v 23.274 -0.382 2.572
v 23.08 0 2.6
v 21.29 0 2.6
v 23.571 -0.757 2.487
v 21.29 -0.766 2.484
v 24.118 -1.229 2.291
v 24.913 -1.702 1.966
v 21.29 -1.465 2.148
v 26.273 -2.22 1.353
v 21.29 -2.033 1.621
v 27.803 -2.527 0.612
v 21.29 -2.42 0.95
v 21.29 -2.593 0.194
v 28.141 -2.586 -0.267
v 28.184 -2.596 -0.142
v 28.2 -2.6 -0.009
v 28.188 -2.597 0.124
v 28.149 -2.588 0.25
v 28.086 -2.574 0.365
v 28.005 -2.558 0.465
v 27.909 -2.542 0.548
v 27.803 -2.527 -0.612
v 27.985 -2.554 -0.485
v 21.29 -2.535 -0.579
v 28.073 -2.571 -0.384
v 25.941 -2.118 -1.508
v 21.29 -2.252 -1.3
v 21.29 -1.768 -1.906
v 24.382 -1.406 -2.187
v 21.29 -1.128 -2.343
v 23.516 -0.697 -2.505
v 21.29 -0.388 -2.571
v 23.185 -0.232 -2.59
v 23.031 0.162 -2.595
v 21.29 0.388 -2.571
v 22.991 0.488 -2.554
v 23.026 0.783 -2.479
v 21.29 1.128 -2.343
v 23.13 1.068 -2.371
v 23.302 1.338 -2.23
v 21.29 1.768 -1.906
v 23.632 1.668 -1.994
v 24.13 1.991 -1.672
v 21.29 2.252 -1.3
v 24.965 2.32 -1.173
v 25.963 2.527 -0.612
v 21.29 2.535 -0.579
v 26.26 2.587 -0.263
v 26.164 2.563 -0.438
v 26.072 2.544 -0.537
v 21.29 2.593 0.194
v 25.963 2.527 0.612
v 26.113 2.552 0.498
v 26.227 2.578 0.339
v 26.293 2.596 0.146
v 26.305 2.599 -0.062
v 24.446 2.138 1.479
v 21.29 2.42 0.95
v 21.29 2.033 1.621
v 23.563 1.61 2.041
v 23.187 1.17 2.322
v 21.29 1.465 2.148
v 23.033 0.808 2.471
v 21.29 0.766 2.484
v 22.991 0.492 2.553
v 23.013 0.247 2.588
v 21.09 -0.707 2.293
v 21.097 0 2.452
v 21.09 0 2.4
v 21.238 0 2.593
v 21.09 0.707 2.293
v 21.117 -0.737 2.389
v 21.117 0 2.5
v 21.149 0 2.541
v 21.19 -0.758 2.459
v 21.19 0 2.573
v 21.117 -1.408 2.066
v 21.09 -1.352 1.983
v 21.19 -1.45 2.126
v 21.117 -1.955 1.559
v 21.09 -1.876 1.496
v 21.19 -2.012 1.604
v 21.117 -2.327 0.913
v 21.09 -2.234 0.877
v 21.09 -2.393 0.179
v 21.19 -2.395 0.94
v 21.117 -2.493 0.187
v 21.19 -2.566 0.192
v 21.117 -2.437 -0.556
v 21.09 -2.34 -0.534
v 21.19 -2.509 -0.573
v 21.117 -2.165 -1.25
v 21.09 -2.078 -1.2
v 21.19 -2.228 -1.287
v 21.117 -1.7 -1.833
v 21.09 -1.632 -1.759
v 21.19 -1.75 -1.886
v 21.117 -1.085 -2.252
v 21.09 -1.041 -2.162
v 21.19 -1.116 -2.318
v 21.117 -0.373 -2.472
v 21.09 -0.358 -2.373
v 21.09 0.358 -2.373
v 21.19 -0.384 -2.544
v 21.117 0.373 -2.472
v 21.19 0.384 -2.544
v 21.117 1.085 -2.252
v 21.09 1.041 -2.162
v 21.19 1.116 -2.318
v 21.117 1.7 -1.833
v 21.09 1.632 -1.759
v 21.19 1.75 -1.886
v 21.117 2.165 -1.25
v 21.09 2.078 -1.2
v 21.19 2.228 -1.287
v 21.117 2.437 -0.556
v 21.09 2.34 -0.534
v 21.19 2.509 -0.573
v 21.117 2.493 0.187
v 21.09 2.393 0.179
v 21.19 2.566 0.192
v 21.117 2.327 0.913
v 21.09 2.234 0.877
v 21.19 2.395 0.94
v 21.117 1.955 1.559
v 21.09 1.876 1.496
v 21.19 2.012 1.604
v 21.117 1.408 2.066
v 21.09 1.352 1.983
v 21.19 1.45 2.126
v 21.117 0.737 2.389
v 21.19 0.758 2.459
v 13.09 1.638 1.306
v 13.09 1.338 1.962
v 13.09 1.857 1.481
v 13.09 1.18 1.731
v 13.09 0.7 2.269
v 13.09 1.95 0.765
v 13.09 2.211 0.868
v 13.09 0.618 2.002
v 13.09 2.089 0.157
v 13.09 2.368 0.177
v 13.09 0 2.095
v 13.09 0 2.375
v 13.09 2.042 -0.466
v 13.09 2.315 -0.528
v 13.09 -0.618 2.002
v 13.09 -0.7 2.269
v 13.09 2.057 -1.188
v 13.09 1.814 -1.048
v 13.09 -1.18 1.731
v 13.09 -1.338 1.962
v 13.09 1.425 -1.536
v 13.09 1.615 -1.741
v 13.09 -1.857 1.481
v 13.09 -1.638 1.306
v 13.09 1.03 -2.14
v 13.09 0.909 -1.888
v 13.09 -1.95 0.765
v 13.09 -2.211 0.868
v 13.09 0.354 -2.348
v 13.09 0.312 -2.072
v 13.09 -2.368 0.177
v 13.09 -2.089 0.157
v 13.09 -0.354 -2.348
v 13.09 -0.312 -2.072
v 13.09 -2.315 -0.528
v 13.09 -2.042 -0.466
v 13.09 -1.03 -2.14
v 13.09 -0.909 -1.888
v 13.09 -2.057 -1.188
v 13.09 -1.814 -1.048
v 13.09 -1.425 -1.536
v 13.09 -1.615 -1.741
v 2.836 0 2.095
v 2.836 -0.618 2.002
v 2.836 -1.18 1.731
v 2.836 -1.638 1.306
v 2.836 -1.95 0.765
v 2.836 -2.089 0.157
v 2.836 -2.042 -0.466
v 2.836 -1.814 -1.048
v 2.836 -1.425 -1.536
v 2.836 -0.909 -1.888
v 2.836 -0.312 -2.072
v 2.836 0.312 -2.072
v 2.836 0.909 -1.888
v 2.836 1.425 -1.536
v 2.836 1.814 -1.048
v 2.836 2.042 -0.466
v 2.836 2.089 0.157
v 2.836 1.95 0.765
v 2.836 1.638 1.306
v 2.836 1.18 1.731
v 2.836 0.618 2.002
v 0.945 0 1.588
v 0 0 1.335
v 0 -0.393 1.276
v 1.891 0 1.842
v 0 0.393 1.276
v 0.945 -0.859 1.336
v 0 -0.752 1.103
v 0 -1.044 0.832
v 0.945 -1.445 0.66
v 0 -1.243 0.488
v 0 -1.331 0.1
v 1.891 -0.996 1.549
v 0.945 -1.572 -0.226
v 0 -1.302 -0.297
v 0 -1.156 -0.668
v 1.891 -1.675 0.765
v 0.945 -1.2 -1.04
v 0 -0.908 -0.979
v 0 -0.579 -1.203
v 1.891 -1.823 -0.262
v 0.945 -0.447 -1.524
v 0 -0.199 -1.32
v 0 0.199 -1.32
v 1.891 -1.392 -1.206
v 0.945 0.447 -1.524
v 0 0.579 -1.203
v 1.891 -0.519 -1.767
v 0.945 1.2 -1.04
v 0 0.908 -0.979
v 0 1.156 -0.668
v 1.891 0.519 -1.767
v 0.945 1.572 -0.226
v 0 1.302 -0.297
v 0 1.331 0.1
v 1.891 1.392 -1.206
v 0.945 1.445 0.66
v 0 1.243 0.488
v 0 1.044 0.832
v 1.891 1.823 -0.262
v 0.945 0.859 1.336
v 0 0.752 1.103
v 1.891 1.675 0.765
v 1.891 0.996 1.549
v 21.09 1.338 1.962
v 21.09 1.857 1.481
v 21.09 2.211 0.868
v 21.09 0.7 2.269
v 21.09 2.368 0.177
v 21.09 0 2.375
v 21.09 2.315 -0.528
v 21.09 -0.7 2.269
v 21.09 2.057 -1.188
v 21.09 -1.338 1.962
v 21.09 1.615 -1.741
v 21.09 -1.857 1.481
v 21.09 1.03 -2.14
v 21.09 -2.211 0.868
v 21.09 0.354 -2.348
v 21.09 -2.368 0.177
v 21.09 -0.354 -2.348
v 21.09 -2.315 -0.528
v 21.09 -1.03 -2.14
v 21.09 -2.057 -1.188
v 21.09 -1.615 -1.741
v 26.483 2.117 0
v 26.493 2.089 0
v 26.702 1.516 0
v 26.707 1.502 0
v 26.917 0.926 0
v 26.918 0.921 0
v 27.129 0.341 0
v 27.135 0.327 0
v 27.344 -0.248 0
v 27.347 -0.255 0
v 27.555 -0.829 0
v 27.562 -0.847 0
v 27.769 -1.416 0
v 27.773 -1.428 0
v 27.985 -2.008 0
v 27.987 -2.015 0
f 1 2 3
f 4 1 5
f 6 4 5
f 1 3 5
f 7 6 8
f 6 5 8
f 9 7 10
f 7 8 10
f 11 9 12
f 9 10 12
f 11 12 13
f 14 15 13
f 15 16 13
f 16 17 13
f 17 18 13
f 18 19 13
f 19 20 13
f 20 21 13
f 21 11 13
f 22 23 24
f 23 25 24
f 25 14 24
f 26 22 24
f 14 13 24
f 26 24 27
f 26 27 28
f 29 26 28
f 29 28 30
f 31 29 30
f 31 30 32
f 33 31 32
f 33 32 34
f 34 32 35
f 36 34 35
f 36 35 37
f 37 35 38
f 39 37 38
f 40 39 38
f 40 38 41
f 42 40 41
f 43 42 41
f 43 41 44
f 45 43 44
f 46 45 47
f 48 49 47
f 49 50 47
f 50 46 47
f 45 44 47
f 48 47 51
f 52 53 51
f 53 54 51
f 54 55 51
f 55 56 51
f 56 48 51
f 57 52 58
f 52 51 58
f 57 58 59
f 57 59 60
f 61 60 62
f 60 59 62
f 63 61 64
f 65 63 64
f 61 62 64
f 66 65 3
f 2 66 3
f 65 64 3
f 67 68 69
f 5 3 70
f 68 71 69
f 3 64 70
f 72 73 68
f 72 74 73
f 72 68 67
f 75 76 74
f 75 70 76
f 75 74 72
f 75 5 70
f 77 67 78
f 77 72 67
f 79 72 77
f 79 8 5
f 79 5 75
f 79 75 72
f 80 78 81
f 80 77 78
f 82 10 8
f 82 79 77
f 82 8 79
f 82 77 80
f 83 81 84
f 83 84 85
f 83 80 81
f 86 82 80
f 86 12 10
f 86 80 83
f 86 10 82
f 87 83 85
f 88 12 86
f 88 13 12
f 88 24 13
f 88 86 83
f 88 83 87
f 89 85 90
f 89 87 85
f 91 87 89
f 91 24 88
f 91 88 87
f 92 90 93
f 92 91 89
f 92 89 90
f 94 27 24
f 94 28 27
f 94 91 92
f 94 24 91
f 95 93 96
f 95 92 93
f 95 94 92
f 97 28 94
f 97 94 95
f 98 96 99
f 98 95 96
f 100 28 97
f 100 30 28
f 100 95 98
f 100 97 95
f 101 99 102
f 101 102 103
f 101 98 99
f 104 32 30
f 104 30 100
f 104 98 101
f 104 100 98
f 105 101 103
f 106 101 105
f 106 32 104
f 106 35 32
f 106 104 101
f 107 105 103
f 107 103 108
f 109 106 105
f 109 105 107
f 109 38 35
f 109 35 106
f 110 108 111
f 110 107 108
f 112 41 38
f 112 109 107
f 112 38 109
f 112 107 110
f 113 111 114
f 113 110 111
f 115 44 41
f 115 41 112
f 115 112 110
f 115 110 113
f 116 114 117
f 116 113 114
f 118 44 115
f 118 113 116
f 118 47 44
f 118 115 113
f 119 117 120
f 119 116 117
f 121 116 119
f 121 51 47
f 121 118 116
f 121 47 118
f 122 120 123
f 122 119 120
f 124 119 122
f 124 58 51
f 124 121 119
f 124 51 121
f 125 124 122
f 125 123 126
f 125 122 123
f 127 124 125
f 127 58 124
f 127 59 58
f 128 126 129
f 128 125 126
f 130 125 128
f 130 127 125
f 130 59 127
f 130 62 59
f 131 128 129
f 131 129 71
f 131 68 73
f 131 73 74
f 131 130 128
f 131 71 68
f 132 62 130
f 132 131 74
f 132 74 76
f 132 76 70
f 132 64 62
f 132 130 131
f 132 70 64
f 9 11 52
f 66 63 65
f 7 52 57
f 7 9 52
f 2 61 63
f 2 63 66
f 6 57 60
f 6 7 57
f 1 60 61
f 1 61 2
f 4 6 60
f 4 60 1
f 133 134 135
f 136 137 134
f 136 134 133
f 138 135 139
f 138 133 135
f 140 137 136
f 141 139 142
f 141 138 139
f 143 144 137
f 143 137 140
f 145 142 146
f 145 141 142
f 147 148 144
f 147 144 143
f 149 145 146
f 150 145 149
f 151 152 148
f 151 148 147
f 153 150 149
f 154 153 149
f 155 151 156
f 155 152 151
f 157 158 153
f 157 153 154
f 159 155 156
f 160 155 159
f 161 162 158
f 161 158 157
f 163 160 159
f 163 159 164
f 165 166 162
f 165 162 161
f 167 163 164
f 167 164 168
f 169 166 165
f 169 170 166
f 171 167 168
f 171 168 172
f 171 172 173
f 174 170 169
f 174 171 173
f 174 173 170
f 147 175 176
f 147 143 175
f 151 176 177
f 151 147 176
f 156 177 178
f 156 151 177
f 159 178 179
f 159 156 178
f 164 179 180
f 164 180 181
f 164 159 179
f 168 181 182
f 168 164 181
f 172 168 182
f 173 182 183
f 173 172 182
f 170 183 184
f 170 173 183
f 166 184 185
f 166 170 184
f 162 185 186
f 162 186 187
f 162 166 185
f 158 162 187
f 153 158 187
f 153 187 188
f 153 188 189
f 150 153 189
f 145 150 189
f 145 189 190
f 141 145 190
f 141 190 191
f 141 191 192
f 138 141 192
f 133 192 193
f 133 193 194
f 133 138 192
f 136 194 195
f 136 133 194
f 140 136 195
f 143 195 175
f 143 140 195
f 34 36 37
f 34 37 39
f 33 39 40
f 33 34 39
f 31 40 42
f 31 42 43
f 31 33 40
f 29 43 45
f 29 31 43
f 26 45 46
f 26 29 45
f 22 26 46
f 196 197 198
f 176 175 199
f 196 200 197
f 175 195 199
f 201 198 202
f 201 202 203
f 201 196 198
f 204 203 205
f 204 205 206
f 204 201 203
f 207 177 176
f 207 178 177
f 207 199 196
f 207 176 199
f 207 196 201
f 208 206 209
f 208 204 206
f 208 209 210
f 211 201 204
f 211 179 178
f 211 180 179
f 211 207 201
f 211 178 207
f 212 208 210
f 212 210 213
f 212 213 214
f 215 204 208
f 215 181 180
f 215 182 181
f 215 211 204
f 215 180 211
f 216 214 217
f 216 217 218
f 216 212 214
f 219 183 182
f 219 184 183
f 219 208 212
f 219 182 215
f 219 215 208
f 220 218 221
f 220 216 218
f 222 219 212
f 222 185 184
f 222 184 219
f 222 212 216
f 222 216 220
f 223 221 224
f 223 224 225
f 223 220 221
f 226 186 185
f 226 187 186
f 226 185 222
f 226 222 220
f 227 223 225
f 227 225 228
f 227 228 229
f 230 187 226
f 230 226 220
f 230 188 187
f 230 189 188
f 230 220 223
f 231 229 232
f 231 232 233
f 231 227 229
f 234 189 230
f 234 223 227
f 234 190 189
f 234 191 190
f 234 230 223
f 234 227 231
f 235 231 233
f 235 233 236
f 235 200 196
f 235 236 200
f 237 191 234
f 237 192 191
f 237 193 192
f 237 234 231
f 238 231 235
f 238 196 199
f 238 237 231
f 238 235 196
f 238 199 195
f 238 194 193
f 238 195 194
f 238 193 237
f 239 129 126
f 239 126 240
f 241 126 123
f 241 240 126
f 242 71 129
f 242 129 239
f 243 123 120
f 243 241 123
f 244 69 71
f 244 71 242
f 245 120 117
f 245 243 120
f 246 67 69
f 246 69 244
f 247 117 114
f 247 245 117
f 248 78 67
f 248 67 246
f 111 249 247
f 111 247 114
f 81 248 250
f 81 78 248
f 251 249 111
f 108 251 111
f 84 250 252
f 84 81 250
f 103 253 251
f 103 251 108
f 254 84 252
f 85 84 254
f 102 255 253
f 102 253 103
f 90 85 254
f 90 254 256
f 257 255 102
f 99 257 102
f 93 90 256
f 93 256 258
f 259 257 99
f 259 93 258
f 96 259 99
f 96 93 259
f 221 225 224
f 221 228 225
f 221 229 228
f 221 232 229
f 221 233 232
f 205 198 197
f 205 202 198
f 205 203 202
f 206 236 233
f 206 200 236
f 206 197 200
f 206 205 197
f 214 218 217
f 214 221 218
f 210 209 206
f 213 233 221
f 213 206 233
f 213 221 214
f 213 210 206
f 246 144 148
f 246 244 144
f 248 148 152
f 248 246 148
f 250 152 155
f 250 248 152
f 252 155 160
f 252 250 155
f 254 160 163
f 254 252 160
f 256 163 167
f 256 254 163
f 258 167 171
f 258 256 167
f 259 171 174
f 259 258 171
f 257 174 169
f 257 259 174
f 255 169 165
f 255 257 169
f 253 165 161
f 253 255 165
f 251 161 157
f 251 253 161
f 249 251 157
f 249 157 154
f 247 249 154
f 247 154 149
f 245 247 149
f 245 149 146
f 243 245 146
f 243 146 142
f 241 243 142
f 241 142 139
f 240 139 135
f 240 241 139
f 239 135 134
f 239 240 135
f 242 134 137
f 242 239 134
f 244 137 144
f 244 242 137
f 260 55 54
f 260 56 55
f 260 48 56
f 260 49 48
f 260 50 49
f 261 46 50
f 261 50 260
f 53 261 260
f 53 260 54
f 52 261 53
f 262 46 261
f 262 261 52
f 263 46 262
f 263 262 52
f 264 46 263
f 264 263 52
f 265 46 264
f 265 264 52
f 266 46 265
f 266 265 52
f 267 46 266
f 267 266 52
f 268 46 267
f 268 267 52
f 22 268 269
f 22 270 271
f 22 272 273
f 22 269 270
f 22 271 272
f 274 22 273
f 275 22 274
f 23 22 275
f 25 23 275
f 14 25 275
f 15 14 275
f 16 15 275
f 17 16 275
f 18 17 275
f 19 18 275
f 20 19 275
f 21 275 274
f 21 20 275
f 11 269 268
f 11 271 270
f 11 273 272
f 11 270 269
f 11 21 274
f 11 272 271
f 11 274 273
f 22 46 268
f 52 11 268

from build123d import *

# Parameters (mm, degrees)
CORTE_EXTRUS_O1_DEPTH = 5
CORTE_EXTRUS_O2_DEPTH = 10
FILETE1_R             = 0.2


with BuildPart() as part:
    # Esboço1 → Revolução1 (revolve)
    with BuildSketch(Plane.XY, mode=Mode.PRIVATE) as revolu_o1_sk:
        Polygon((0, 0), (0, 1.335), (2.836358614, 2.095), (13.09, 2.095), (13.09, 2.375), (21.09, 2.375), (21.09, 2.6), (22.469186813, 2.6), (28.2, 2.6), (28.2, 0), align=None)
    revolve(revolu_o1_sk.sketch.rotate(Axis((0, 0, 0), (1, 0, 0)), 90), axis=Axis((0, 0, 0), (1, 0, 0)))

    # Esboço2 → Corte-extrusão1 (cut, symmetric)
    with BuildSketch(Plane.XY):
        Polygon((28.2, -2.6), (25.943384548, 3.6), (29, 3.6), (29, -2.6), align=None)
    extrude(amount=CORTE_EXTRUS_O1_DEPTH, both=True, mode=Mode.SUBTRACT)

    # Esboço3 → Corte-extrusão2 (cut, along a direction that is not the sketch's normal)
    with BuildSketch(Plane(origin=(-3.863561719, -2.6, 0), x_dir=(0, 0, 1), z_dir=(0, 1, 0))):
        with BuildLine():
            Line((-4.077730135, 25.063561719), (-0.611977577, 31.692934924))
            ThreePointArc((-0.611977577, 31.692934924), (0, 32.063561719), (0.611977577, 31.692934924))
            Line((0.611977577, 31.692934924), (4.077730135, 25.063561719))
            ThreePointArc((4.077730135, 25.063561719), (0, 41.665104992), (-4.077730135, 25.063561719))
        make_face()
    extrude(amount=CORTE_EXTRUS_O2_DEPTH, dir=(-0.3420201433256694, 0.9396926207859082, 0), mode=Mode.SUBTRACT)

    # Filete1
    filete1_edges = [part.edges().sort_by_distance(p)[0] for p in [
        (21.09, 0, -2.6),
    ]]
    fillet(filete1_edges, radius=FILETE1_R)


solid = part.part
